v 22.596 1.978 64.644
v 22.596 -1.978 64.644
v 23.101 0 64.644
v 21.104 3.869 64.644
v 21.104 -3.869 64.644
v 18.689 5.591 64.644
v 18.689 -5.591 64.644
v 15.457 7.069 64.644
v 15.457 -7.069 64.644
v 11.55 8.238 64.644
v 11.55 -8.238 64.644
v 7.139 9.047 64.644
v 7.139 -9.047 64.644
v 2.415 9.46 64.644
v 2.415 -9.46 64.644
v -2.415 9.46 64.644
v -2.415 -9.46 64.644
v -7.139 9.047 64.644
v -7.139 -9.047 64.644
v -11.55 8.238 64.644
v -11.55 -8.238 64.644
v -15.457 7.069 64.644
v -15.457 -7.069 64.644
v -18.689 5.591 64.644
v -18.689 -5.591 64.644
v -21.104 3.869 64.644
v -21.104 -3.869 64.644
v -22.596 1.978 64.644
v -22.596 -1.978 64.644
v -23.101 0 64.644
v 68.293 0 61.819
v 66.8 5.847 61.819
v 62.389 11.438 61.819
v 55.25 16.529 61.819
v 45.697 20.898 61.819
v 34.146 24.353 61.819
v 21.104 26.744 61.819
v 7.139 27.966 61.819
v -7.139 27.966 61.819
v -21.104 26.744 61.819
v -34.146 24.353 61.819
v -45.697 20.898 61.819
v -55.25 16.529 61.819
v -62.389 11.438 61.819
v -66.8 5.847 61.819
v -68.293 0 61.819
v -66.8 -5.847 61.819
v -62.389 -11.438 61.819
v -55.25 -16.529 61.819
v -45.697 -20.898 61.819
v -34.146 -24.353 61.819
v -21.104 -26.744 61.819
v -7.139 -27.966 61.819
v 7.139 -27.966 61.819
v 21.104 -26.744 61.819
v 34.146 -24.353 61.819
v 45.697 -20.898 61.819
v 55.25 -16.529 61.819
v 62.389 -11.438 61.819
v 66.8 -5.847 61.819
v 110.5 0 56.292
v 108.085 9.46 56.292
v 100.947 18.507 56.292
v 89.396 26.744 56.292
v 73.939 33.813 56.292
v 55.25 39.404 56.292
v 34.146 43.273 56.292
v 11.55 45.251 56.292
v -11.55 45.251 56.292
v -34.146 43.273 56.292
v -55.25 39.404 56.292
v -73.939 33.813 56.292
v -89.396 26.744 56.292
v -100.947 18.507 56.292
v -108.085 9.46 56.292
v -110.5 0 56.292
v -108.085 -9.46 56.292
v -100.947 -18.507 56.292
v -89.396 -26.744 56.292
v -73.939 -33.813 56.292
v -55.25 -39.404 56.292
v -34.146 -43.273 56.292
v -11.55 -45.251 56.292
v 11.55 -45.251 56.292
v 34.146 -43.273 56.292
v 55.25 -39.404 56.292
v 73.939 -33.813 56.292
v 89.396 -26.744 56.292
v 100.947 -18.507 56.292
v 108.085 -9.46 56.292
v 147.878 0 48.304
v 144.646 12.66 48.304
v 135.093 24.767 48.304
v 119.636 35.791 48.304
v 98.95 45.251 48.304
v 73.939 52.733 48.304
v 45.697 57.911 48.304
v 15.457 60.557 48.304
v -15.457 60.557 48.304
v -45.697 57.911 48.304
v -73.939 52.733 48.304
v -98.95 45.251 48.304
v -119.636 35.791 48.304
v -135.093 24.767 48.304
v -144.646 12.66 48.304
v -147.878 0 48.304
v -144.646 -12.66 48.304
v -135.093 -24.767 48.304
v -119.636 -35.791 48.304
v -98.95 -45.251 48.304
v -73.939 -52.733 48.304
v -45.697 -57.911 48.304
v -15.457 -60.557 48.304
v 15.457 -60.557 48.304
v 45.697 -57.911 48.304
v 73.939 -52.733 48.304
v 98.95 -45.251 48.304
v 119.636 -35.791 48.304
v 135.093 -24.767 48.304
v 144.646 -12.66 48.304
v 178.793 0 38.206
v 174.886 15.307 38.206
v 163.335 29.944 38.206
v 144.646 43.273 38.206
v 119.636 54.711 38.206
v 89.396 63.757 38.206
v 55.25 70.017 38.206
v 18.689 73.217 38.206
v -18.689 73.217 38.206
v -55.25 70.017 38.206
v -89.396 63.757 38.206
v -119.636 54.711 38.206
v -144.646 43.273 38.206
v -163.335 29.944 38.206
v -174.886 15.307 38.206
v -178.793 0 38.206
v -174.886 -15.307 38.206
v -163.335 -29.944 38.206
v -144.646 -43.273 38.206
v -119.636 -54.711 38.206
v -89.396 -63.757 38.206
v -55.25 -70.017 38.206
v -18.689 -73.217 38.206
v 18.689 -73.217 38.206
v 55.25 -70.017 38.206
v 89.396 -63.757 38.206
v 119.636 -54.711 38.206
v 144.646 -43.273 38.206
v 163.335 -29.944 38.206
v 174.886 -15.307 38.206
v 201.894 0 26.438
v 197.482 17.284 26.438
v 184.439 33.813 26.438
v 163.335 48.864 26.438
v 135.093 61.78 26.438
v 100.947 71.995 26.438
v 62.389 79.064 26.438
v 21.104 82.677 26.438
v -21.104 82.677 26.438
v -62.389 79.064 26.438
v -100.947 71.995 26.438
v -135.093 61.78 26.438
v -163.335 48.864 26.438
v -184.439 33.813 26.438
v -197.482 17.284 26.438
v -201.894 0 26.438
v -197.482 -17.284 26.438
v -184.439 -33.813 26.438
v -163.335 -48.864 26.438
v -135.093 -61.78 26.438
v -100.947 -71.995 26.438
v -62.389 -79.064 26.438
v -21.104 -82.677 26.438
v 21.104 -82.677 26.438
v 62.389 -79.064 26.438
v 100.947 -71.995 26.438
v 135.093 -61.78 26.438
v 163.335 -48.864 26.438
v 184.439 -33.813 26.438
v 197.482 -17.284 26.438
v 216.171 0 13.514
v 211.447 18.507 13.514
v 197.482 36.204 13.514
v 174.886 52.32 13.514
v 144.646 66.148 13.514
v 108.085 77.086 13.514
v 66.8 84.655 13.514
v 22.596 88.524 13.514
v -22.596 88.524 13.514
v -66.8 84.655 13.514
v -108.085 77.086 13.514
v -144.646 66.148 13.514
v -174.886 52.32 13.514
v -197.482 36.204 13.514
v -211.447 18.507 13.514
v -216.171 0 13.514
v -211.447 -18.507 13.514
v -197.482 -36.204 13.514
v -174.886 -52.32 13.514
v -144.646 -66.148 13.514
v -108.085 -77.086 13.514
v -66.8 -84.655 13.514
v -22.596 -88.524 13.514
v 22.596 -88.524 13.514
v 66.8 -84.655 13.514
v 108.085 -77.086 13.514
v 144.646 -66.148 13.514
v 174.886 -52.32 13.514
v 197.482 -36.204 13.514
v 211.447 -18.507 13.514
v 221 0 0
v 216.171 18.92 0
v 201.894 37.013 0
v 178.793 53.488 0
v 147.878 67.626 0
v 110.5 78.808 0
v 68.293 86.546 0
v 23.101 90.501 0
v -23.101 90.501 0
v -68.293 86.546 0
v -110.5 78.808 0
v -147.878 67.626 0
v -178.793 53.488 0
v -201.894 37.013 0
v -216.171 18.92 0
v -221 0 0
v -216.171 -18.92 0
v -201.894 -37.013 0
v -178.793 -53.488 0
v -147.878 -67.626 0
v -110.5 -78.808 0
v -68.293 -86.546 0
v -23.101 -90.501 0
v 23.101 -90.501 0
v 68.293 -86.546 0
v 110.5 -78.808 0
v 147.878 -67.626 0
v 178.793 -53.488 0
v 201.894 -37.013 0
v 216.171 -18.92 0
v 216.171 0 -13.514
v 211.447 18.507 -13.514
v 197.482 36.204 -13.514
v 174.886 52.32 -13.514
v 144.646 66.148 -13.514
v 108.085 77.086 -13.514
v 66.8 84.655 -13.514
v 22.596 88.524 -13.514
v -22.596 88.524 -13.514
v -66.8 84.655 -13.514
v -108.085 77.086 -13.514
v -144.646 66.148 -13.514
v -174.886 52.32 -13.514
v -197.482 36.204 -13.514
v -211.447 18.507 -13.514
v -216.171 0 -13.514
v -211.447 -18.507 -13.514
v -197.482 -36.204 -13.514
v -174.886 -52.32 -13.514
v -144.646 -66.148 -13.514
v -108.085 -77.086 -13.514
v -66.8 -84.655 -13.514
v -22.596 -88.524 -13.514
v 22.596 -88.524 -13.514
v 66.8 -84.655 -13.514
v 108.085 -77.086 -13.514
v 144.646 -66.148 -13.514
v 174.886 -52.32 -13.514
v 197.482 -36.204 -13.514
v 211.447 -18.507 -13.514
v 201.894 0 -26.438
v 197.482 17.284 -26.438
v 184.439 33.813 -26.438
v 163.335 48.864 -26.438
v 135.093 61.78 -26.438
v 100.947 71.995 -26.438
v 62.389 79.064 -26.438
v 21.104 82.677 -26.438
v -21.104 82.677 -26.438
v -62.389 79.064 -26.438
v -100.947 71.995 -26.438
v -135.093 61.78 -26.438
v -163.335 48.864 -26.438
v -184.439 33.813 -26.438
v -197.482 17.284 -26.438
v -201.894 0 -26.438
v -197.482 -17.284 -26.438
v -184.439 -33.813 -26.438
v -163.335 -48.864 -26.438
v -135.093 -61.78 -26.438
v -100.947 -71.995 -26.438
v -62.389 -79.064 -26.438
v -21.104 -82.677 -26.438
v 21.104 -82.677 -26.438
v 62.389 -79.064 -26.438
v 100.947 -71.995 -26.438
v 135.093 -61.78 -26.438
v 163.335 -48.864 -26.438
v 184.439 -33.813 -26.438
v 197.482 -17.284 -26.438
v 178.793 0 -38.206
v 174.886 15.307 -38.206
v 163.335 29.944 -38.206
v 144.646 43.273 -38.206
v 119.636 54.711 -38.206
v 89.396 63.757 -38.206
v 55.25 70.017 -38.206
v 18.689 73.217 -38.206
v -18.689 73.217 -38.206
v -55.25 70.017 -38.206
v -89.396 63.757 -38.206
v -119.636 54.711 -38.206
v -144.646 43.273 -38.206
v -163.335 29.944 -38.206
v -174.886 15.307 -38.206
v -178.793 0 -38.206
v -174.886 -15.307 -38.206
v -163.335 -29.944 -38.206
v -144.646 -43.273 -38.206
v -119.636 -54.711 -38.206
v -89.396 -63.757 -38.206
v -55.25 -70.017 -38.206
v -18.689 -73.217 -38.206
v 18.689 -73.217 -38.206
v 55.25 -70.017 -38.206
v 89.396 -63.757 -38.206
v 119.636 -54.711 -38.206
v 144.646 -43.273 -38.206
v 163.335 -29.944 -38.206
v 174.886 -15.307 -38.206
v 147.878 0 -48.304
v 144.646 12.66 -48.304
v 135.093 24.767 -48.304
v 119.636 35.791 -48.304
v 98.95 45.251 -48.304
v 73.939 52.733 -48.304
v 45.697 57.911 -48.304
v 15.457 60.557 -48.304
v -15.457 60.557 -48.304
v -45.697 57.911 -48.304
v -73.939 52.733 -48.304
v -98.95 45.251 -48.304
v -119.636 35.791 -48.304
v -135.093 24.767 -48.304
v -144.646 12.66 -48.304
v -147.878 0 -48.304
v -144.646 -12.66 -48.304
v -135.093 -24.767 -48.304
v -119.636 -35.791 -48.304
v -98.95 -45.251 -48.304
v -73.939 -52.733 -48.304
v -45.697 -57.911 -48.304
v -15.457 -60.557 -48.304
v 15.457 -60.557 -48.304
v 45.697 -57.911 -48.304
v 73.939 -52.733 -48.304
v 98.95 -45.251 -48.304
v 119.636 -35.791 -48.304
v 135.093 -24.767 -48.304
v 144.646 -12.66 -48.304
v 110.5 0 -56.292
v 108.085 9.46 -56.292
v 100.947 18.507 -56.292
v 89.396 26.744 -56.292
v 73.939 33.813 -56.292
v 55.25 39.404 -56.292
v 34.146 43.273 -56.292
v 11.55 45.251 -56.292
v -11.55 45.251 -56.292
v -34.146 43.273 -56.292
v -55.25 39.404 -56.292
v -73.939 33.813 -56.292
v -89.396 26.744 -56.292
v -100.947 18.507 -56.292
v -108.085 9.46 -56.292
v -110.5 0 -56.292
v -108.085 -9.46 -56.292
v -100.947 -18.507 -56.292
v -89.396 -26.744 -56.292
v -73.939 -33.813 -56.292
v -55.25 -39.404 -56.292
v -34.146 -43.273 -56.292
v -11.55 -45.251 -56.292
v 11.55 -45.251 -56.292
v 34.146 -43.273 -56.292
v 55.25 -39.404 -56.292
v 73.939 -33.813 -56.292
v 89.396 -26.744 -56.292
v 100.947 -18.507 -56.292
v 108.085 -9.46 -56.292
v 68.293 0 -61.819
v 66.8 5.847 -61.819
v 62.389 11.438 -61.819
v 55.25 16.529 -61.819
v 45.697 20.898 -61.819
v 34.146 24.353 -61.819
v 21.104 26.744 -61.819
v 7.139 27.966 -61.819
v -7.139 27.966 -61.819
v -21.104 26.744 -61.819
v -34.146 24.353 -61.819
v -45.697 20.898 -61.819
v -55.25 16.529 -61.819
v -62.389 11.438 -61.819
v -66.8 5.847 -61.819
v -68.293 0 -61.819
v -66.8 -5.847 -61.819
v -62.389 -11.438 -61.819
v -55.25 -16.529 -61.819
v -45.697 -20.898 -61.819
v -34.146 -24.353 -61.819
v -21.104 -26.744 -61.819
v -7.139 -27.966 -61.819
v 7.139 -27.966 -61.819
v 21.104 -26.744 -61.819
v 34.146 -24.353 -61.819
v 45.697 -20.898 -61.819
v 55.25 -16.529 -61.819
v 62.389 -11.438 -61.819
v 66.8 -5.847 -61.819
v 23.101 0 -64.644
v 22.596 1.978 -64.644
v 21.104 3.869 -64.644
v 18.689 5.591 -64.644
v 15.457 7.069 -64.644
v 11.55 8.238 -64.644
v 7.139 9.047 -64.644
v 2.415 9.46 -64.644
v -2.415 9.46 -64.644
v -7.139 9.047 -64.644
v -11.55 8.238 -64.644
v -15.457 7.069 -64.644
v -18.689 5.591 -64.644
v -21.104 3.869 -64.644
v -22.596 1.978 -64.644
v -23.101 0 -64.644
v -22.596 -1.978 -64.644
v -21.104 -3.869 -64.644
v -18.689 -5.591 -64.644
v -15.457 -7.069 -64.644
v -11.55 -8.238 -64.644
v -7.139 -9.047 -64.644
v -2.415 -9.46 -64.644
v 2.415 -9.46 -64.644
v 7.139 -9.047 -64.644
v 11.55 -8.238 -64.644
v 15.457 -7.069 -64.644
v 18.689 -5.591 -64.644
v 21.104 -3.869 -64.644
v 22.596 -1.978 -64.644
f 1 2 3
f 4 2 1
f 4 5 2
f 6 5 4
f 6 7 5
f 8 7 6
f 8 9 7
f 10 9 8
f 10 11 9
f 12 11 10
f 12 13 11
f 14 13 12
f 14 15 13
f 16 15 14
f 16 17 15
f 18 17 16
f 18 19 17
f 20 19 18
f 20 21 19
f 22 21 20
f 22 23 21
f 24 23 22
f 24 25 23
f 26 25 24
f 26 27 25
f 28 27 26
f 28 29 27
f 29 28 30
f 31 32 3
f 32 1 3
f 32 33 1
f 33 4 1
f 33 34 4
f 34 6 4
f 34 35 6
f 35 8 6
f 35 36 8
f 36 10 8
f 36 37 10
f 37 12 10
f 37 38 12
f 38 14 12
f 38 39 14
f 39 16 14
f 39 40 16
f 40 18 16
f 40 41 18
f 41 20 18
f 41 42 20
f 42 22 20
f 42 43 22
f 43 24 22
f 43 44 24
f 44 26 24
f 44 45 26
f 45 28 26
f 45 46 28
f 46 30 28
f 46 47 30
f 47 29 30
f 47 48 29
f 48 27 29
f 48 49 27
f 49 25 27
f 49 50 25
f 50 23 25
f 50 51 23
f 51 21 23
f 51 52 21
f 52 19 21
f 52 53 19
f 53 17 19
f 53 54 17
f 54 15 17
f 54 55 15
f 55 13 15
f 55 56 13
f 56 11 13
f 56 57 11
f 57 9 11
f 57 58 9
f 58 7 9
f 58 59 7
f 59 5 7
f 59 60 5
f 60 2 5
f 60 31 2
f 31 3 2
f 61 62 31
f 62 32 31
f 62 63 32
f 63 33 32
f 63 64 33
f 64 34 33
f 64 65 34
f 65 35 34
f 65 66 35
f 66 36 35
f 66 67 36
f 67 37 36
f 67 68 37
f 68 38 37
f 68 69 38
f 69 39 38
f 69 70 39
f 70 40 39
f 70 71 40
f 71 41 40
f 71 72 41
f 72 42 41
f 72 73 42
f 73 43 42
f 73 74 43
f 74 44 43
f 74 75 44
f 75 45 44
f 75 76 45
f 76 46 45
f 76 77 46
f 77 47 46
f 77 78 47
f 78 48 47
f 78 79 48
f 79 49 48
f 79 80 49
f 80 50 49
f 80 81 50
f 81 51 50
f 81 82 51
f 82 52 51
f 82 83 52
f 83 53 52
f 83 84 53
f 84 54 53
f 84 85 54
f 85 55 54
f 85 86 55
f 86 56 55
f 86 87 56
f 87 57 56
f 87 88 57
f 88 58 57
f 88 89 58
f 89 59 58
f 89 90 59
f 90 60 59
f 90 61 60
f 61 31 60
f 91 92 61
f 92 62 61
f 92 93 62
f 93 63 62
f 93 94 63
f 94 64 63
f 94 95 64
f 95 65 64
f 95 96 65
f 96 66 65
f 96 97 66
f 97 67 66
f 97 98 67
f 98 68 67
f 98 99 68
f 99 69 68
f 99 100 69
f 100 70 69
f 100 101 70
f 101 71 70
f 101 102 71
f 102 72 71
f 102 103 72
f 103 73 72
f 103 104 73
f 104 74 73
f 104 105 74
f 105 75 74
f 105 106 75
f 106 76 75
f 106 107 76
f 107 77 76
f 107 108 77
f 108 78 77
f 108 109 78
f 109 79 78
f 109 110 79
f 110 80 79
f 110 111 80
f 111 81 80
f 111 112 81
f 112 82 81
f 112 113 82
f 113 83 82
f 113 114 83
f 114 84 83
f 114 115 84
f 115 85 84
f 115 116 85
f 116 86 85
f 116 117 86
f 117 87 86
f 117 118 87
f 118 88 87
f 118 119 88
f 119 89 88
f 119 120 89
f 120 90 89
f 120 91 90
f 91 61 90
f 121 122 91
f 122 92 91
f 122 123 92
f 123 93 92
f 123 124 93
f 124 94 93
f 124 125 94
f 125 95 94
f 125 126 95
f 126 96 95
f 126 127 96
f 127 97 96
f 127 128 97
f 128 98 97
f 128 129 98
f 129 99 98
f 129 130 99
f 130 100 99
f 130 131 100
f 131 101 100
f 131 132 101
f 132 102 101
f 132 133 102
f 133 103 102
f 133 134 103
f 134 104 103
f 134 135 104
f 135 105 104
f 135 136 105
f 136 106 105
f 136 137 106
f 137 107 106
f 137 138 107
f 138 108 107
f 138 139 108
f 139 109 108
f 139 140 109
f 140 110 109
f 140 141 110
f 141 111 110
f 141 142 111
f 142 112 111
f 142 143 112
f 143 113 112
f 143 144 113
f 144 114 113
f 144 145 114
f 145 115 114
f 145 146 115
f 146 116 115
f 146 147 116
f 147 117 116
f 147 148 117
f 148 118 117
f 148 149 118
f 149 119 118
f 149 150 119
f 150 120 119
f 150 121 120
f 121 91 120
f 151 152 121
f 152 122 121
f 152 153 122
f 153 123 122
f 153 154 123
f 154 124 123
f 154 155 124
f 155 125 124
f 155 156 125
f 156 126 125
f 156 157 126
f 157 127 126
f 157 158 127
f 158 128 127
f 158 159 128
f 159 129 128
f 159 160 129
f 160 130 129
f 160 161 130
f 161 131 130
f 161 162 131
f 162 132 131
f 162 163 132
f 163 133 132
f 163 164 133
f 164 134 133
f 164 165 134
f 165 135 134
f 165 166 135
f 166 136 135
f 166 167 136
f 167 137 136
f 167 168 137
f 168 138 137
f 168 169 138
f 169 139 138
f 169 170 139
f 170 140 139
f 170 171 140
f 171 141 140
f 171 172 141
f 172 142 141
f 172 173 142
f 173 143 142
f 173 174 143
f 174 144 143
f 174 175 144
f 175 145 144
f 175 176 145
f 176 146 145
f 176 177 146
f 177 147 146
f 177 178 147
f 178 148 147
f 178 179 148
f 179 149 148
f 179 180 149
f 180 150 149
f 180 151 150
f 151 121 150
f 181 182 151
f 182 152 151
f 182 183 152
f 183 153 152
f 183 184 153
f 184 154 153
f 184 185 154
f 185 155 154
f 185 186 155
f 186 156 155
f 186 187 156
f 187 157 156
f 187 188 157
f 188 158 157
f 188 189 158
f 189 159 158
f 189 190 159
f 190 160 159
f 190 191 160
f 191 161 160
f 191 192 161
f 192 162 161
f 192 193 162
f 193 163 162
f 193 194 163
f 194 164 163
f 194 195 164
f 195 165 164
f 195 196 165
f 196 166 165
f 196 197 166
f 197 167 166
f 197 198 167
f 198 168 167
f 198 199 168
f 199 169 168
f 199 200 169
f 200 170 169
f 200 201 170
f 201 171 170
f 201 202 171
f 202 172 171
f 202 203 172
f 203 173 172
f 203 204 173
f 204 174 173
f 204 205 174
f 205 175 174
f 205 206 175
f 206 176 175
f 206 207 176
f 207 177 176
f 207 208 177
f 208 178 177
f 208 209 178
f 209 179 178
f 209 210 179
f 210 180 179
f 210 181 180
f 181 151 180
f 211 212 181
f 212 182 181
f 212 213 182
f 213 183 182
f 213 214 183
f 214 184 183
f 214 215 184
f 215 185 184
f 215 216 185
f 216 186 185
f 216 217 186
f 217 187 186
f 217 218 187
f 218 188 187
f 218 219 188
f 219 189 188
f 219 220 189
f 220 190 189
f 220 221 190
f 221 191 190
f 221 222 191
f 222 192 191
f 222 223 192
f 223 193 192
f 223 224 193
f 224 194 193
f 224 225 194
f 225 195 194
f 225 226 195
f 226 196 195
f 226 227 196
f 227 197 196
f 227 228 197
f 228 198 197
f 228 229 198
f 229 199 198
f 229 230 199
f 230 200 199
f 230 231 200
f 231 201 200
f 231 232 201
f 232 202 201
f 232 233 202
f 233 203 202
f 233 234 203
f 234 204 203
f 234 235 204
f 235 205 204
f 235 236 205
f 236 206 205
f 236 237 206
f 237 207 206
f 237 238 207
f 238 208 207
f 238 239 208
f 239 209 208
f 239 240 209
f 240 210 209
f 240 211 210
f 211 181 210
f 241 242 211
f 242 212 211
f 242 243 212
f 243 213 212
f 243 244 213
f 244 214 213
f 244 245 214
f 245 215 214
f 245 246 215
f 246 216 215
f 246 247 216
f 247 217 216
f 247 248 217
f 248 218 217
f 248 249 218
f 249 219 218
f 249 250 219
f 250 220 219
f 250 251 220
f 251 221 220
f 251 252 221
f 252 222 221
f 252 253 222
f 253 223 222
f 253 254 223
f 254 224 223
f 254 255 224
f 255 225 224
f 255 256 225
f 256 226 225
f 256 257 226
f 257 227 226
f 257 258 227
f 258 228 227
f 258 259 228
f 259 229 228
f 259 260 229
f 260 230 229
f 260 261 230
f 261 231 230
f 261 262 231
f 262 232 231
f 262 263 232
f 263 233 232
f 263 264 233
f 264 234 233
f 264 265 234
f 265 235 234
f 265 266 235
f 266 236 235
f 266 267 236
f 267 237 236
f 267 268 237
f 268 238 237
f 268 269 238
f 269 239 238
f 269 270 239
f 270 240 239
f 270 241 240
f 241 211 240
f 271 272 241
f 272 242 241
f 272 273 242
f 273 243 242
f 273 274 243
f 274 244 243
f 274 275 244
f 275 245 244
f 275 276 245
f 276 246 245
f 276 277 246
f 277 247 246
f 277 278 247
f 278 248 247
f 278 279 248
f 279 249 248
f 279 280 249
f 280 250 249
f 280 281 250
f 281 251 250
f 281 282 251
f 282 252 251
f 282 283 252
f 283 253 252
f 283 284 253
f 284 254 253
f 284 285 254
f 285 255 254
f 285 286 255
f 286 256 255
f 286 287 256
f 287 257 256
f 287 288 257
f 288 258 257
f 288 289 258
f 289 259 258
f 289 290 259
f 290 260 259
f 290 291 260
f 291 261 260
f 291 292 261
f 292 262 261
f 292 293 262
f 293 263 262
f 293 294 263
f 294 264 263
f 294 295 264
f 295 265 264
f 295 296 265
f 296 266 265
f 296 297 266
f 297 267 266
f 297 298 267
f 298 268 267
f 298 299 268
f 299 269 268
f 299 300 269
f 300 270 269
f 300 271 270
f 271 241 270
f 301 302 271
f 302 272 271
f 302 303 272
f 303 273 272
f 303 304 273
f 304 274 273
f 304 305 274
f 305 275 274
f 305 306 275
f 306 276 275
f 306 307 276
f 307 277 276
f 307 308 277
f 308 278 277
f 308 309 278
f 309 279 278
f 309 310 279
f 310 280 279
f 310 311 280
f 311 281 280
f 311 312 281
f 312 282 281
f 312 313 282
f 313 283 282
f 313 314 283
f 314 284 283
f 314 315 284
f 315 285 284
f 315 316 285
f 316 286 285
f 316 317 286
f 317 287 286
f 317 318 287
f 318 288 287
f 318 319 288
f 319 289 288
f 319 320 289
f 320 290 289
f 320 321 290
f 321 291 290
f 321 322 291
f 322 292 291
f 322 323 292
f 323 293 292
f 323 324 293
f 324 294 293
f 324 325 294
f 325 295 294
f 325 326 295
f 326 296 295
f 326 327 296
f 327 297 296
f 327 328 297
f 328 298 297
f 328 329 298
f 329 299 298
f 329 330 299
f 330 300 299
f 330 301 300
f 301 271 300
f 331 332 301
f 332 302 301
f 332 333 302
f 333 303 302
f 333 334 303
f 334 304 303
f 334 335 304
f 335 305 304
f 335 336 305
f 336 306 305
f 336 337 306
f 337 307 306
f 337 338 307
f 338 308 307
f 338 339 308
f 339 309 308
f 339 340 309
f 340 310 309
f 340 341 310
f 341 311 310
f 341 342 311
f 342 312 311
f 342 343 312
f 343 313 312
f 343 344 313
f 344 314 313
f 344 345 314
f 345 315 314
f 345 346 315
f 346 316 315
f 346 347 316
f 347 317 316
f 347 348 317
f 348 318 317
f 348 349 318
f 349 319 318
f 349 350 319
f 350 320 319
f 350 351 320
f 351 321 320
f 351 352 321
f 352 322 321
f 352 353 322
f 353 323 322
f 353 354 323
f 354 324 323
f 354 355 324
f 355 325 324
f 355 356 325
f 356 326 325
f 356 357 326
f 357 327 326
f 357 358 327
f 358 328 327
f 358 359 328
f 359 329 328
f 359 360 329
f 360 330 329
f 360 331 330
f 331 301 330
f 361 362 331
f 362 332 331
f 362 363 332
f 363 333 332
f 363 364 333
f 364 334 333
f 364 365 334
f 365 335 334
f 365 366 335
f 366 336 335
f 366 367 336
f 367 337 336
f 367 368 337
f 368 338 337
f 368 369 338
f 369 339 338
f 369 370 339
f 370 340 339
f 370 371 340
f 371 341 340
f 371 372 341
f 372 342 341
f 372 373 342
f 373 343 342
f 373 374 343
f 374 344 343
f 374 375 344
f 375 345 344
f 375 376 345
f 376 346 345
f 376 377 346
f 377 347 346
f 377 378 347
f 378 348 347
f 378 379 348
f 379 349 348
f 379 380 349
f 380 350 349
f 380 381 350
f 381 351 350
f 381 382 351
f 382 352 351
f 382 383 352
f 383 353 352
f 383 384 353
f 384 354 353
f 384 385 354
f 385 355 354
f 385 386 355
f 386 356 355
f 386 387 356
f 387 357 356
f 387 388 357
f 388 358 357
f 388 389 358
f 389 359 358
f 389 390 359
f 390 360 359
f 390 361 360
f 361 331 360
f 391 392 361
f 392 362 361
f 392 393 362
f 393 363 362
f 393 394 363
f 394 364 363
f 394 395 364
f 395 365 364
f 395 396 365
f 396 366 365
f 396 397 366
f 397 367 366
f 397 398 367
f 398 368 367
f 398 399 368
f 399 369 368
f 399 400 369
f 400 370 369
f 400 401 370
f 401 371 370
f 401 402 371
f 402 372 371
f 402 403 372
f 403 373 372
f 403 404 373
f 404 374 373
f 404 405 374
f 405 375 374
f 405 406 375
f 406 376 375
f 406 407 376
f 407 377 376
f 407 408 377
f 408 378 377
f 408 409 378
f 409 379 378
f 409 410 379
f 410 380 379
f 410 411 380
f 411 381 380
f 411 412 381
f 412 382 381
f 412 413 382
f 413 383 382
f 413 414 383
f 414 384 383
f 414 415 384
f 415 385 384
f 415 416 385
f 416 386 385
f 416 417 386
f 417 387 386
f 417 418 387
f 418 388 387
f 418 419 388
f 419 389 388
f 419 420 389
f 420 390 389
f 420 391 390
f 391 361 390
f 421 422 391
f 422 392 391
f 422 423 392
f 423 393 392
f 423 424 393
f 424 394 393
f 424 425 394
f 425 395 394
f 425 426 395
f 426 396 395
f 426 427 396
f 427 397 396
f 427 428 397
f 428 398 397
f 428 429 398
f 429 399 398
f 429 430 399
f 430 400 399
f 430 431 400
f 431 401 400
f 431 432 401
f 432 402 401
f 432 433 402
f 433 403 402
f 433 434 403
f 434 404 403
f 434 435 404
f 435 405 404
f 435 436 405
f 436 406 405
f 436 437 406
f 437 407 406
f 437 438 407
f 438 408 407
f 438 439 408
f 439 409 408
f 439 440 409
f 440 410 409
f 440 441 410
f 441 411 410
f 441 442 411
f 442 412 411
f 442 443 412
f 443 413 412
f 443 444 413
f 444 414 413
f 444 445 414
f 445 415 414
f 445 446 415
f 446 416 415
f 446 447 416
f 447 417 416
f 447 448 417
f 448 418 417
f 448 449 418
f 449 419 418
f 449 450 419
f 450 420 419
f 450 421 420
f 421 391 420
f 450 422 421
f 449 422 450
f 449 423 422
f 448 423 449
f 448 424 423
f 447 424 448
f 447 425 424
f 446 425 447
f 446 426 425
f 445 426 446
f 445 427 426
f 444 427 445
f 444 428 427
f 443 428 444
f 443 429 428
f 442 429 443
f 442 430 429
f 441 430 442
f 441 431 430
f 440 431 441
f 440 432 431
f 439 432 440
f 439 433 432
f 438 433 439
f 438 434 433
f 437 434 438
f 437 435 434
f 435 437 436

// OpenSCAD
// Generated by SolidPython 1.0.1 on 2020-07-29 00:46:52


scale(v = [17, 7, 5]) {
	sphere(r = 13);
}
/***********************************************
*********      SolidPython code:      **********
************************************************
 
# import packages: SolidPython
from solid import *
from solid.utils import *
from itertools import chain, combinations, permutations


class Resize:

    def __init__(self, scad_file):
        self.scad_file = scad_file
        #self.scad_file = import_scad(scad_file)
        # cone/cylinder param:
        self.r1 = 0
        self.r2 = 0
        self.h = 0
        # rectangular prism param:
        self.w = 0
        self.l = 0
        # ellipse param:
        self.r = 0

    # import OpenScad code (file name corresponds to shape)


    # classify shape + parameters
    def assign(self, param1, param2, param3):
        if self.scad_file == 'cone.scad':
            self.r1 = param1
            self.r2 = param2
            self.h = param3
        elif self.scad_file == 'cylinder.scad':
            self.r1 = param1
            self.r2 = param2
            self.h = param3
        elif self.scad_file == 'rectangularPrism.scad':
            self.h = param1
            self.l = param2
            self.w = param3
        else:
            self.r = param1
            self.h = param2

    # resize parameters
    def iterate(self):
        x = range(3, 20, 2)
        i = 1
        if self.scad_file == 'cone.scad':
            tempList = list(permutations(x, 2))
            for temp in tempList:
                param1 = temp[0]
                param2 = temp[1]
                filepath = 'produced_scad_files/' + 'cone' + str(param1) + '_' + str(param2) + '_' + '.scad'
                scad_render_to_file(cylinder(h=param1, r1=param2, r2=0), filepath)

        elif self.scad_file == 'cylinder.scad':
            tempList = list(permutations(x, 3))
            for temp in tempList:
                param1 = temp[0]
                param2 = temp[1]
                filepath = 'produced_scad_files/' + 'cylinder' + str(param1) + '_' + str(param2) + '_' + '.scad'
                scad_render_to_file(cylinder(h=param1, r1=param2, r2=param2), filepath)

        elif self.scad_file == 'rectangularPrism.scad':
            tempList = list(permutations(x, 3))
            for temp in tempList:
                param1 = temp[0]
                param2 = temp[1]
                param3 = temp[2]
                filepath = 'produced_scad_files/' + 'rectangularPrism' + str(param1) + '_' + str(param2) + '_' + str(
                    param3) + '.scad'
                scad_render_to_file(cube(size=(param1, param2, param3)), filepath)

        elif self.scad_file == 'ellipse.scad':
            tempList = list(permutations(x, 4))
            for temp in tempList:
                param1 = temp[0]
                param2 = temp[1]
                param3 = temp[2]
                param4 = temp[3]
                filepath = 'produced_scad_files/' + 'ellipse' + str(param1) + '_' + str(param2) + '_' + str(param3) + '_' + str(param4) + '.scad'
                scad_render_to_file(scale([param1, param2, param3])(sphere(r=param4)), filepath)

    def render_to_scadfile(self):
        scad_render_to_file(scad, 'example.scad') 
 
************************************************/
